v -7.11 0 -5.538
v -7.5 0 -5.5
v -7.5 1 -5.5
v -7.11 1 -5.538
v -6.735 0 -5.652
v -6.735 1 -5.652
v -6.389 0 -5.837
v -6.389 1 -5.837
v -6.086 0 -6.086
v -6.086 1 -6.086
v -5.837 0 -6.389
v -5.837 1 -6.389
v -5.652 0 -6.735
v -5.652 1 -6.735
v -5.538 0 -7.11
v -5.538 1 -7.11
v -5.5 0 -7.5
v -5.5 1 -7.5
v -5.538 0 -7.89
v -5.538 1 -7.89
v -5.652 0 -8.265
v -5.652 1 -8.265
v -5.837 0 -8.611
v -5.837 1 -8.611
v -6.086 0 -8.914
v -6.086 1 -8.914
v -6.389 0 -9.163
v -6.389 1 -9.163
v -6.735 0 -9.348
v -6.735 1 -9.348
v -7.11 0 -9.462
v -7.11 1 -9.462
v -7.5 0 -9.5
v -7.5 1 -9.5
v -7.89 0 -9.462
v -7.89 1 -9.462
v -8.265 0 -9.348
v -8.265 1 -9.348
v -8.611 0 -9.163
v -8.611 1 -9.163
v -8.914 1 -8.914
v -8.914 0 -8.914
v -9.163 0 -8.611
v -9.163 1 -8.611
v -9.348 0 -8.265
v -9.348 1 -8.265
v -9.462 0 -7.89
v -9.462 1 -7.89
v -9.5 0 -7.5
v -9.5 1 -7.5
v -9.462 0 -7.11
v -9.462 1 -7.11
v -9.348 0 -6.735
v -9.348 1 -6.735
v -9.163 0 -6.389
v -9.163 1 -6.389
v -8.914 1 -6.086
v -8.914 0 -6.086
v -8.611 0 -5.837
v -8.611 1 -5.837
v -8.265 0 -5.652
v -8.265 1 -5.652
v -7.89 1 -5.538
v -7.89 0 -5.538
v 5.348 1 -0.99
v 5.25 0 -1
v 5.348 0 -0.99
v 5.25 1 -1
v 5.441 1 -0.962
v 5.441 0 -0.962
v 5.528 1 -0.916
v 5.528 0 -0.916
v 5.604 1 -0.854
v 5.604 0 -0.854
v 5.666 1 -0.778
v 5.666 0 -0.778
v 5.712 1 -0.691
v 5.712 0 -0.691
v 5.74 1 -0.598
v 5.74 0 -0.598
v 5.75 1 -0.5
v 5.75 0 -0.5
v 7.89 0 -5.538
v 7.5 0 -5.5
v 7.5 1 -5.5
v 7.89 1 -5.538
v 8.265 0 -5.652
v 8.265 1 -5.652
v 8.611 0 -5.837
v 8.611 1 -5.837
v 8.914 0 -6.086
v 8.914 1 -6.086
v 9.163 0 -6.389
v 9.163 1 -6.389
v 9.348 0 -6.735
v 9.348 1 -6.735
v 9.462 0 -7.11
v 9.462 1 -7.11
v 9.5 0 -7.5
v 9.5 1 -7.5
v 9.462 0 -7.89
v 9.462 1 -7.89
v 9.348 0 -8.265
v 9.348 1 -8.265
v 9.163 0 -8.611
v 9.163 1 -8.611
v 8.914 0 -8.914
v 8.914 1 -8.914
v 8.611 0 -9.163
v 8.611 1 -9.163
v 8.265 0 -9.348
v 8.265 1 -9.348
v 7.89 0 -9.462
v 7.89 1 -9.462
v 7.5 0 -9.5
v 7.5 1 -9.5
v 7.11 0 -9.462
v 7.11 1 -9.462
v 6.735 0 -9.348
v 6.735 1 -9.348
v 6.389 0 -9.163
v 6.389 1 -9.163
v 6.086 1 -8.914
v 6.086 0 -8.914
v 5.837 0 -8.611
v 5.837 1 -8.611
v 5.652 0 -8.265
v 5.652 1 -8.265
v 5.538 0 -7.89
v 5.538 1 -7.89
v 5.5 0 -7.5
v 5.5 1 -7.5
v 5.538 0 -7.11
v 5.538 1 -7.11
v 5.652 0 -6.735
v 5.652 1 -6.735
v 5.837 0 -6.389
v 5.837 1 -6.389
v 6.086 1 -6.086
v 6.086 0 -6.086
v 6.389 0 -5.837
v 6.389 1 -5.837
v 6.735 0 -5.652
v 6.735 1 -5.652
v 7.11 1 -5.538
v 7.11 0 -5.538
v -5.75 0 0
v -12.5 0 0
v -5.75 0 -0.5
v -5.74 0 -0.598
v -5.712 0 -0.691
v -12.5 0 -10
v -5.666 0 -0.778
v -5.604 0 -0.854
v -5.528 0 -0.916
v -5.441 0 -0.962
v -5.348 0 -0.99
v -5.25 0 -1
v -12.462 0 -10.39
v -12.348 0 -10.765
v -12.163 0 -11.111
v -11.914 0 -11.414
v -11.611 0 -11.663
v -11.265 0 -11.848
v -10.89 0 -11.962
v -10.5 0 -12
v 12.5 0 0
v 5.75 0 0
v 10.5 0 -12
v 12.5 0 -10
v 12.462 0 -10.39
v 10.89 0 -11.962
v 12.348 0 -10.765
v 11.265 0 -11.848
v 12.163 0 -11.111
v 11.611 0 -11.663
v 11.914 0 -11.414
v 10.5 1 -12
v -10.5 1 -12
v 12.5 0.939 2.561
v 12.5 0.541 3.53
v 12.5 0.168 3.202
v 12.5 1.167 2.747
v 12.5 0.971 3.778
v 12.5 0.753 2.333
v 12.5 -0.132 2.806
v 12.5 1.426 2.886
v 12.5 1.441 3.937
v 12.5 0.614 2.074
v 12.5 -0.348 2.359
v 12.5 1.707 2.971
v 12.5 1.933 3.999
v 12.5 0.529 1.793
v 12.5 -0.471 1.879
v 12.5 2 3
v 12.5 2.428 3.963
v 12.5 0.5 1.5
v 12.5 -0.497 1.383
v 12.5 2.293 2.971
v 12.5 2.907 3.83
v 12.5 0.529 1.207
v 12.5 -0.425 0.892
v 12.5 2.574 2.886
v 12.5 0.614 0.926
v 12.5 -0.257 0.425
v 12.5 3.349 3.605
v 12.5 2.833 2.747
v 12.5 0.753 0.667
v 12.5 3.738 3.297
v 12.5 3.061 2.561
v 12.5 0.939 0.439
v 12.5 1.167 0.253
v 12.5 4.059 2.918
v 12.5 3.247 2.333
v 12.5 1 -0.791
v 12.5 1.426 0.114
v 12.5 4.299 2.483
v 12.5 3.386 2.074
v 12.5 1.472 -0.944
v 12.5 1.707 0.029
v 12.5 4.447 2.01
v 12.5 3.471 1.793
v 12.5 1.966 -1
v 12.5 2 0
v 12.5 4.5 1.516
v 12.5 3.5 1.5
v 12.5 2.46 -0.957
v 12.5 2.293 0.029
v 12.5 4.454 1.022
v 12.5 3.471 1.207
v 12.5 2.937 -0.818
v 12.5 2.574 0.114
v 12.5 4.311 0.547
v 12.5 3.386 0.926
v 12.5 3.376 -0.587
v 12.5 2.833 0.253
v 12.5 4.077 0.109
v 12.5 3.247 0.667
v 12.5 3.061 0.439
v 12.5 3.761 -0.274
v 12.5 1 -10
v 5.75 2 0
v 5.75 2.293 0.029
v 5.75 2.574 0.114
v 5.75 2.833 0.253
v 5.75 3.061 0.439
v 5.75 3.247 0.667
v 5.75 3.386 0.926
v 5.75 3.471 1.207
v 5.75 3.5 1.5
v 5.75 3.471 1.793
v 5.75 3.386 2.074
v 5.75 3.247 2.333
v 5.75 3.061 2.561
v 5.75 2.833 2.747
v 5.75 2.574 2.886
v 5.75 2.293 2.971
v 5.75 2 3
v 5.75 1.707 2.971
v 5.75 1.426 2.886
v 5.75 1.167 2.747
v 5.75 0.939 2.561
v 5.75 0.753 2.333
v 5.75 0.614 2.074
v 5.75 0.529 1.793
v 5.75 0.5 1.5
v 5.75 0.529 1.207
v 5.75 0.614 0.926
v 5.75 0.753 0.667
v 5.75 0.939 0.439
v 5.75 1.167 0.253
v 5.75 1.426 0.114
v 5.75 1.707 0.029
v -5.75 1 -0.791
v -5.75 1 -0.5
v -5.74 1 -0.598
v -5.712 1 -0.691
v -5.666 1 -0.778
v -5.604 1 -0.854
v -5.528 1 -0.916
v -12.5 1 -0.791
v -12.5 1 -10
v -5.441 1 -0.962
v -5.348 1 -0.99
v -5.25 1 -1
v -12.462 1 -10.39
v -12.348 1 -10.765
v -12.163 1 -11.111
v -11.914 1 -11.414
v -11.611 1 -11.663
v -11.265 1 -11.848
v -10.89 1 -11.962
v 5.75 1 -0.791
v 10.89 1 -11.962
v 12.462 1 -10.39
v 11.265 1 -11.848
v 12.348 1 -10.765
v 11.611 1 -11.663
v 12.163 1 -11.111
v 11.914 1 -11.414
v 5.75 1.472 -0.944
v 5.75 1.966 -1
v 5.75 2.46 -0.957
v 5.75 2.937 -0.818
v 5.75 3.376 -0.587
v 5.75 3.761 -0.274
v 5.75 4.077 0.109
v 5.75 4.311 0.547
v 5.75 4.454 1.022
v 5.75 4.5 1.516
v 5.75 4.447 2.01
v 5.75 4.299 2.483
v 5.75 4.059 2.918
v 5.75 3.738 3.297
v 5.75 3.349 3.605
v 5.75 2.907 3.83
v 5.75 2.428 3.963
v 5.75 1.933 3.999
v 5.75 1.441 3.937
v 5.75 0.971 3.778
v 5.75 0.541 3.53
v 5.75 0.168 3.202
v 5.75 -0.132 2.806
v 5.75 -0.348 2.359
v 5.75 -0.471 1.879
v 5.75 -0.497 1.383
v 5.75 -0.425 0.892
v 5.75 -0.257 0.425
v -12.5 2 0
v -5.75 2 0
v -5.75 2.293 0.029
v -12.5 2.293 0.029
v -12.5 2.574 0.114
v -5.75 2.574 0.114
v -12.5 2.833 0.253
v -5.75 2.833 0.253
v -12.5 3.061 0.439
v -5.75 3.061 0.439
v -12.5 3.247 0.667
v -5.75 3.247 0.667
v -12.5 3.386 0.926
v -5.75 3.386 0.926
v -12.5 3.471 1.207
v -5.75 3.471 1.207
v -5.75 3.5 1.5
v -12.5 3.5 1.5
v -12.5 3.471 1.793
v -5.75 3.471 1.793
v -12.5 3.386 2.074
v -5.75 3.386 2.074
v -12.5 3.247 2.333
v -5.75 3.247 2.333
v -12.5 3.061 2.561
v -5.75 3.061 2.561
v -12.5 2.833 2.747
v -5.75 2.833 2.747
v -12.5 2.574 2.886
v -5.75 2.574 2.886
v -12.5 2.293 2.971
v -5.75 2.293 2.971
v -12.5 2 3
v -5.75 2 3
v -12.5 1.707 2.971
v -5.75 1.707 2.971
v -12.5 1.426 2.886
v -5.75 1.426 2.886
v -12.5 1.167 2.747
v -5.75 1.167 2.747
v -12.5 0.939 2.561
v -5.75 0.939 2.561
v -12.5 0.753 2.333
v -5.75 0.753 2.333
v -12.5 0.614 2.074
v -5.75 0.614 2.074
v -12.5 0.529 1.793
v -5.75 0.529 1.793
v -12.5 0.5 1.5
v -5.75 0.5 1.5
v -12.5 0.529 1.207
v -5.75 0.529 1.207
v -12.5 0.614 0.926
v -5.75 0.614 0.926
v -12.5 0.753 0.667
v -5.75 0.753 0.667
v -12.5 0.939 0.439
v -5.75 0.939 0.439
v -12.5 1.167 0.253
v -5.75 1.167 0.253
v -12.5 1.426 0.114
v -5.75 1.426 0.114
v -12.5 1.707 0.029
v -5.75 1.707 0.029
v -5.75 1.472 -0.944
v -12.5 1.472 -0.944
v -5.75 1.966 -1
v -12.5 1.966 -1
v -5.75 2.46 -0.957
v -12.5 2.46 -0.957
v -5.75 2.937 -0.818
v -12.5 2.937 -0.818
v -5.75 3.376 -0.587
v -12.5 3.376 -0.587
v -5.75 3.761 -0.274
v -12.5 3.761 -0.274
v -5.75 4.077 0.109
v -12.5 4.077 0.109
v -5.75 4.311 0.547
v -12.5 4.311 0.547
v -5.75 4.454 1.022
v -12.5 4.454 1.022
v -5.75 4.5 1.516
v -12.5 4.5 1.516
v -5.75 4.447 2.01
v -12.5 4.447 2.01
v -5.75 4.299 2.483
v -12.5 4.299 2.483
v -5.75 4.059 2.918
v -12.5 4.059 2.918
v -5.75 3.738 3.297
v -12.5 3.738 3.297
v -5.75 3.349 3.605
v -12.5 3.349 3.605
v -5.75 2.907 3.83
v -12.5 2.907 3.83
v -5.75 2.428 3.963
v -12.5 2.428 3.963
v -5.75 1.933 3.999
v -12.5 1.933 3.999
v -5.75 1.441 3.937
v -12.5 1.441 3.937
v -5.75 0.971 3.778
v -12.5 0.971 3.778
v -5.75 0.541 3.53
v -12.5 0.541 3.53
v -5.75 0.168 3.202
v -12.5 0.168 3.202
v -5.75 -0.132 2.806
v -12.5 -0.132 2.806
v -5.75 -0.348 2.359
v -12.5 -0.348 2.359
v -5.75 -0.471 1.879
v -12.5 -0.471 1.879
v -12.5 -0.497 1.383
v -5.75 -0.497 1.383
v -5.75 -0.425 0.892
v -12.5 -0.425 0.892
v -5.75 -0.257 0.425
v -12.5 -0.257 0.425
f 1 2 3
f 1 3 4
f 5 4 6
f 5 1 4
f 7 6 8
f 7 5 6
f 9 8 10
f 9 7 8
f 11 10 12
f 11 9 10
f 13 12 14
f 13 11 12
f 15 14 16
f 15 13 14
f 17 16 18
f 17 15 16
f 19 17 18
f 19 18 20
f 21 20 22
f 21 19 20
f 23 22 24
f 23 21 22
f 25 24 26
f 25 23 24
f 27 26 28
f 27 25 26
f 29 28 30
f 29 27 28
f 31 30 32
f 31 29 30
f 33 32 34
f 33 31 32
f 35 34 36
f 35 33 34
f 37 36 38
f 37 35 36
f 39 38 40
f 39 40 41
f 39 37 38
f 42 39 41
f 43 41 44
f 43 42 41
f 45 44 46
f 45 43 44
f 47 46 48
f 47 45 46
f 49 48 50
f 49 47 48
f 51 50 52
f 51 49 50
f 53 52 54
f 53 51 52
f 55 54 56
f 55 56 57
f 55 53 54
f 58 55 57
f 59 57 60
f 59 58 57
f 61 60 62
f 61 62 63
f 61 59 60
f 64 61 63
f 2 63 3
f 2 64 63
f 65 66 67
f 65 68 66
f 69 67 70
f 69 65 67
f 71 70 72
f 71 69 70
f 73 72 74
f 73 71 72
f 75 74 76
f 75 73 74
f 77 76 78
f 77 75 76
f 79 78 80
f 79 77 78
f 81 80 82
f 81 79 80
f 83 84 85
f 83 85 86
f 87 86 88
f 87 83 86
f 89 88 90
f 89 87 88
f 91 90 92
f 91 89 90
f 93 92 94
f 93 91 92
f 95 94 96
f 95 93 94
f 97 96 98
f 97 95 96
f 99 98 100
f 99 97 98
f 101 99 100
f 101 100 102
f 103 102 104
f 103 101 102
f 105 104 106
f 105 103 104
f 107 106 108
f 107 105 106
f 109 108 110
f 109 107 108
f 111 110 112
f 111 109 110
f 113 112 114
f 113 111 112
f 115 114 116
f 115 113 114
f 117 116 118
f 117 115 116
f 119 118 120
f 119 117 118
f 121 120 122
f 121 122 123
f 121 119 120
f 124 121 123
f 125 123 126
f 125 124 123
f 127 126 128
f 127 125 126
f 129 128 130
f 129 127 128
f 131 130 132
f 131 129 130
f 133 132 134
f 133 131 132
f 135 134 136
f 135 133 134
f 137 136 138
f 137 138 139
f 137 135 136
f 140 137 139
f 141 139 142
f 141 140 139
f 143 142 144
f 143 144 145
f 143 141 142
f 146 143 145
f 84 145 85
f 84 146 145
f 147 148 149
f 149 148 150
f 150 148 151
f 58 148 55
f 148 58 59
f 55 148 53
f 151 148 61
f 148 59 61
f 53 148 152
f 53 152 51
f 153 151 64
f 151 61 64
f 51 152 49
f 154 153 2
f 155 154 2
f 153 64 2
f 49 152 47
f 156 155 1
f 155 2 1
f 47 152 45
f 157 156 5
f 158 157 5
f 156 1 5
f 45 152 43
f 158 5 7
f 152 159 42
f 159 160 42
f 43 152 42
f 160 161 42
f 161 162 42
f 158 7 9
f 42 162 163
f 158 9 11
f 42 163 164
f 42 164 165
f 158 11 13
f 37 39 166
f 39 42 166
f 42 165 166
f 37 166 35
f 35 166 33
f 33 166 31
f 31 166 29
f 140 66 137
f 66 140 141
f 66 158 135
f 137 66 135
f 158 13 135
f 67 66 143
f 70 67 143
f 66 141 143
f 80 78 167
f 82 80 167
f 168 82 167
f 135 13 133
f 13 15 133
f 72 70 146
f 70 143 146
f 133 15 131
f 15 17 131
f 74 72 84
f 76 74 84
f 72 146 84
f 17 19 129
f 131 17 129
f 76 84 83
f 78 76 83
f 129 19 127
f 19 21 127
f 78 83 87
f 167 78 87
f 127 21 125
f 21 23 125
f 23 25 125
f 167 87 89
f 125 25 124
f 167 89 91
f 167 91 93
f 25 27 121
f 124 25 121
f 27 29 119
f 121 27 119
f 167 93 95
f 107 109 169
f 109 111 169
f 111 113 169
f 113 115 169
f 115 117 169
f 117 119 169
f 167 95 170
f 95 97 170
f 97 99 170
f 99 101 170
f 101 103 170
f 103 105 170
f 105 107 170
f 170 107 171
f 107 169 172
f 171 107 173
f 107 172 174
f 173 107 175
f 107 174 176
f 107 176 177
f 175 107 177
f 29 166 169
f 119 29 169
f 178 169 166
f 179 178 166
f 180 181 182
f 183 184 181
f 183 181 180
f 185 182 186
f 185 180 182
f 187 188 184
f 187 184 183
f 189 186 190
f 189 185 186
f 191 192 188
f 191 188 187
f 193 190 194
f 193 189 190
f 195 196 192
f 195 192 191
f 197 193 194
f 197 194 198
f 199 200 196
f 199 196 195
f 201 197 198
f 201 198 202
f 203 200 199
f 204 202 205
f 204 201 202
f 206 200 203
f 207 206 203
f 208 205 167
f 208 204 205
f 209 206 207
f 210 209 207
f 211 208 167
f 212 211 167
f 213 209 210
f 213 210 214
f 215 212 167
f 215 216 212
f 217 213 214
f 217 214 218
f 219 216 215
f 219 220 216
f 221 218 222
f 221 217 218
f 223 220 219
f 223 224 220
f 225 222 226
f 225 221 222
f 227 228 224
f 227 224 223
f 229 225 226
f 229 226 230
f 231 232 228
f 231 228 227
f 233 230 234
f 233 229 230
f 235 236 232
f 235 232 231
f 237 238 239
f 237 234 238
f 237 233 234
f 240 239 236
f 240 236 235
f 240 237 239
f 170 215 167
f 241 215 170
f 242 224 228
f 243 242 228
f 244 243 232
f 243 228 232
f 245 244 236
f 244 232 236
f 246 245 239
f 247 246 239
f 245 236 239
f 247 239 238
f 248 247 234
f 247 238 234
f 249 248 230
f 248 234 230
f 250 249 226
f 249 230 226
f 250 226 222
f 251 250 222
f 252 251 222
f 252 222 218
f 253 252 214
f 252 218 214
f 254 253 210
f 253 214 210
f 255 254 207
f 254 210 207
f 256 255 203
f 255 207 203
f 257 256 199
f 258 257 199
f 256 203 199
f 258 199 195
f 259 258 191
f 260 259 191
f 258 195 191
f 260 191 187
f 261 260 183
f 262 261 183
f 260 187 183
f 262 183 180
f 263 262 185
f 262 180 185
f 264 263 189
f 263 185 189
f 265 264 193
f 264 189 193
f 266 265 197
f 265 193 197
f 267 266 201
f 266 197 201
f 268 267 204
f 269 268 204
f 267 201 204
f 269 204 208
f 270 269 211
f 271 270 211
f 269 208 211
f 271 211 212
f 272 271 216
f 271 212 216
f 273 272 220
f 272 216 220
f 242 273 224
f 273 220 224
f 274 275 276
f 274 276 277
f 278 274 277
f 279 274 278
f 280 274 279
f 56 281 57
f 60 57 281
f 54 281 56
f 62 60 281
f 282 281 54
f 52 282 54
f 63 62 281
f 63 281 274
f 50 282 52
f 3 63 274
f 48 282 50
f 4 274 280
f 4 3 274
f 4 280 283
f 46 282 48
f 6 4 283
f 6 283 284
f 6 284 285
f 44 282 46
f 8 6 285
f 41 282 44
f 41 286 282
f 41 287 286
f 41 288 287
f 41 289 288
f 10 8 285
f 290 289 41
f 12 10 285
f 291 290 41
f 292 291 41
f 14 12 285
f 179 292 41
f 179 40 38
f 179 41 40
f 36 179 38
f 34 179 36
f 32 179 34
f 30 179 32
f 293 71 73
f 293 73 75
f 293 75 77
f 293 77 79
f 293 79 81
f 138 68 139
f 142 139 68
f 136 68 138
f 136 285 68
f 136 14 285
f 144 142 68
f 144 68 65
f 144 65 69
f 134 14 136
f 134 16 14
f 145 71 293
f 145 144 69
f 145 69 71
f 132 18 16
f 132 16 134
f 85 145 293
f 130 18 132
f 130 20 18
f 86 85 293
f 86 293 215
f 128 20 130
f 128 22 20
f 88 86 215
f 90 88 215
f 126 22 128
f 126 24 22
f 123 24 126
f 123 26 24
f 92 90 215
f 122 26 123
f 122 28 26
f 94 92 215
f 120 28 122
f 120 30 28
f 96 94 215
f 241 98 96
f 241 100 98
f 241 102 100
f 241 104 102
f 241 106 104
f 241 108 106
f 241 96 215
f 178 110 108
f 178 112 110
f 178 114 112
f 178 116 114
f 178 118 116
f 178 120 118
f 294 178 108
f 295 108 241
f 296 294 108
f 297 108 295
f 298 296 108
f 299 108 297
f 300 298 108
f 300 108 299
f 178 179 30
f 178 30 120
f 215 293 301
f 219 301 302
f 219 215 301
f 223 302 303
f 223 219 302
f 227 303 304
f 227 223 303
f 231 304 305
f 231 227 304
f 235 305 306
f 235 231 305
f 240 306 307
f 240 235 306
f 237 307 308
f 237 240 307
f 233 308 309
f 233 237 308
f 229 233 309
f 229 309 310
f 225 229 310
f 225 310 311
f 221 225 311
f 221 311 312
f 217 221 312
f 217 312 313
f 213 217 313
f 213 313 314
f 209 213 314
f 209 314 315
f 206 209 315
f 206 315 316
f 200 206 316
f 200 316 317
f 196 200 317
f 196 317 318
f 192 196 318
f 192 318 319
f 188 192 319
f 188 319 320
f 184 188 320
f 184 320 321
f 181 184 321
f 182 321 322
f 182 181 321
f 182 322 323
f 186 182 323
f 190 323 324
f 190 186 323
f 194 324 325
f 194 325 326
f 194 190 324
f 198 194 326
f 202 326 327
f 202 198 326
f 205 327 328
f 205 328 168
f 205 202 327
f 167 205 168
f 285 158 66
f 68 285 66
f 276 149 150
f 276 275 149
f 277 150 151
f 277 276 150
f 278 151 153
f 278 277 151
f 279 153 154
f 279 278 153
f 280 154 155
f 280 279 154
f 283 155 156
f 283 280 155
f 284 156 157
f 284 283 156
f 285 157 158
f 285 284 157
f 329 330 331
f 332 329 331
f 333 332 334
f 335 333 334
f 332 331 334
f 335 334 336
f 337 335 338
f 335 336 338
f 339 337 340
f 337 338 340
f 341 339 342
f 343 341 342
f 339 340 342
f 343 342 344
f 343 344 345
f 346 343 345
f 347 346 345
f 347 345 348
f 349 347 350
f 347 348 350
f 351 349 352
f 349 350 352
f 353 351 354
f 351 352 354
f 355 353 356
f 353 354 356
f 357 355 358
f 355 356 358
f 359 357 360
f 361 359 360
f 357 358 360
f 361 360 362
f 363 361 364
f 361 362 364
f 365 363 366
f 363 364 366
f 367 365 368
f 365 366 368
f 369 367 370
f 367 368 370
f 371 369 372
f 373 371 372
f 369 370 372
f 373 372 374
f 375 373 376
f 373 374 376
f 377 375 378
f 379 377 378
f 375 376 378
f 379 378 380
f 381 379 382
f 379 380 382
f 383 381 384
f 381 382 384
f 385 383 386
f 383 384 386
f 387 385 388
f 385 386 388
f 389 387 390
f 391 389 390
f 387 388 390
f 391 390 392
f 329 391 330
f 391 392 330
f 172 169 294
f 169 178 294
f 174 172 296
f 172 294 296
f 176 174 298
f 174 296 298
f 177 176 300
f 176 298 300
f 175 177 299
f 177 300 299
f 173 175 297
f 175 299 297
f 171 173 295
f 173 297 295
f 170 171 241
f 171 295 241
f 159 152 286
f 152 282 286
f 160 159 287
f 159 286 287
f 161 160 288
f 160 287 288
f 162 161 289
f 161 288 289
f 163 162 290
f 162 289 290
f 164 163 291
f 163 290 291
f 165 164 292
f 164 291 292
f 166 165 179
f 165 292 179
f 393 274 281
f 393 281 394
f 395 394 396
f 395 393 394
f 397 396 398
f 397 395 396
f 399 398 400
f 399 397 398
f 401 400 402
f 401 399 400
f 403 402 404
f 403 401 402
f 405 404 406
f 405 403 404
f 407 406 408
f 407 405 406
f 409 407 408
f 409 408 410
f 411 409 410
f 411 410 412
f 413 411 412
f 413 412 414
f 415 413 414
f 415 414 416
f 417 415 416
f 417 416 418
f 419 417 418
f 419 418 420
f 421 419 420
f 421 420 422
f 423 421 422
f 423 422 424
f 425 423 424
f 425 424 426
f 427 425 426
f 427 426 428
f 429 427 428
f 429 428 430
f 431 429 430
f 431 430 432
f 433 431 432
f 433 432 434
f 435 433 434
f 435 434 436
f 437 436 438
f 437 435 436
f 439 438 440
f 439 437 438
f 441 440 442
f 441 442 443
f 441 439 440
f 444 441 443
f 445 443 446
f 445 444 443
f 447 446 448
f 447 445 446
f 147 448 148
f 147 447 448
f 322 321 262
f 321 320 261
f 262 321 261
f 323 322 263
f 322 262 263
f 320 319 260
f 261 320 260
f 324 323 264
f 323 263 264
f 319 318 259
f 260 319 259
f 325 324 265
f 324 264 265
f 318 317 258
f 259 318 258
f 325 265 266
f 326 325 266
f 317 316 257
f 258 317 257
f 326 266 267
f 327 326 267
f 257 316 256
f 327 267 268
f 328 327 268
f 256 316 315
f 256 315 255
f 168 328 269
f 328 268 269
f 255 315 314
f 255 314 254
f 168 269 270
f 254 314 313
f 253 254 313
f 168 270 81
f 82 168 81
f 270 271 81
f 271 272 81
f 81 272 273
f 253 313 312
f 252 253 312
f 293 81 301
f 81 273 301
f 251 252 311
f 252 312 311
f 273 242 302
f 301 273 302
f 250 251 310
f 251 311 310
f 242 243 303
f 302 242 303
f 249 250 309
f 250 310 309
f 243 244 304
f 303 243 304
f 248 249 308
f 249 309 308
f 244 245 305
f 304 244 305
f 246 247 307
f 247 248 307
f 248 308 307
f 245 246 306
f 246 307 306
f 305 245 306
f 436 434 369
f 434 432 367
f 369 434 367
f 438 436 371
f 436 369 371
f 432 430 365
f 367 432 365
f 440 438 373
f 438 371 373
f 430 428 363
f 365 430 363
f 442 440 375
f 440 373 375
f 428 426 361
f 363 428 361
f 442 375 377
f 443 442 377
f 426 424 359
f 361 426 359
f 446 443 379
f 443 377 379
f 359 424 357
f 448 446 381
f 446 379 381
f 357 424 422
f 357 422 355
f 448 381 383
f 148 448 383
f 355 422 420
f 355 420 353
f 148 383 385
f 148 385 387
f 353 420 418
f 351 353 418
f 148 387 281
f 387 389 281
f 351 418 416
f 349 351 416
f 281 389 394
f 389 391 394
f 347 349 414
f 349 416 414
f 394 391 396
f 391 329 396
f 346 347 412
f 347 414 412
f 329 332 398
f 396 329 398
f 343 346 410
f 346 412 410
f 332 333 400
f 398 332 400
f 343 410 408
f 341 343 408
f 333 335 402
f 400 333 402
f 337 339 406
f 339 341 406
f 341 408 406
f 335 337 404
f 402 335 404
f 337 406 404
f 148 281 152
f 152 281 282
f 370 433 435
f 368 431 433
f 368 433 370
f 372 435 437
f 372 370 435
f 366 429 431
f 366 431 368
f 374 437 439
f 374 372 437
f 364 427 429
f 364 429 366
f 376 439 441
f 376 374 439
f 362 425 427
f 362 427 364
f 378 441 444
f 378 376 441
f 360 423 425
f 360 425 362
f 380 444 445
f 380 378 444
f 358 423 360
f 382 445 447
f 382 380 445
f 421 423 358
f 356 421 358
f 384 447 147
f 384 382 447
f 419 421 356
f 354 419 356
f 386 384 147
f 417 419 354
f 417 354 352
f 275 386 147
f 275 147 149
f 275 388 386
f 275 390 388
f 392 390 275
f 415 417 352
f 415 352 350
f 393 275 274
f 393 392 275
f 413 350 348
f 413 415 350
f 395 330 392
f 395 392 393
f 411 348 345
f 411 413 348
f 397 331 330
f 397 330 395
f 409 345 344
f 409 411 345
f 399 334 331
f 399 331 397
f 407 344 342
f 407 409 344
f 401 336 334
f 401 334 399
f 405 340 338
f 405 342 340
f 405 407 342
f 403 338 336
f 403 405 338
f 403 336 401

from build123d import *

# Parameters (mm, degrees)
SKETCH_1_R      = 2
EXTRUDE_1_DEPTH = 1
FILLET_1_R      = 2
FILLET_2_R      = 0.5
EXTRUDE_START   = -5.75
SKETCH_2_R      = 2.5
SKETCH_2_R_2    = 1.5
EXTRUDE_2_DEPTH = 6.75
EXTRUDE_START_2 = 12.5
SKETCH_2_3_R    = 2.5
SKETCH_2_3_R_2  = 1.5
EXTRUDE_3_DEPTH = 6.75


with BuildPart() as part:
    # 草图1 → 凸台-拉伸1 (new body)
    with BuildSketch(Plane(origin=(0, 0, 0), x_dir=(1, 0, 0), z_dir=(0, 1, 0))):
        Polygon((-5.75, 0), (-5.75, 1), (5.75, 1), (5.75, 0), (12.5, 0), (12.5, 1), (12.5, 12), (-12.5, 12), (-12.5, 1), (-12.5, 0), align=None)
        with Locations(Location((-7.5, 7.5, 0), (0, 0, 270))):
            Circle(SKETCH_1_R, mode=Mode.SUBTRACT)
        with Locations(Location((7.5, 7.5, 0), (0, 0, 270))):
            Circle(SKETCH_1_R, mode=Mode.SUBTRACT)
    extrude(amount=EXTRUDE_1_DEPTH)

    # 圆角1
    fillet_1_edges = [part.edges().sort_by_distance(p)[0] for p in [
        (-12.5, 0.5, -12),
        (12.5, 0.5, -12),
    ]]
    fillet(fillet_1_edges, radius=FILLET_1_R)

    # 圆角2
    fillet_2_edges = [part.edges().sort_by_distance(p)[0] for p in [
        (5.75, 0.5, -1),
        (-5.75, 0.5, -1),
    ]]
    fillet(fillet_2_edges, radius=FILLET_2_R)

    # 草图2 → 凸台-拉伸2 (add)
    with BuildSketch(Plane(origin=(0, 0, 0), x_dir=(0, 0, -1), z_dir=(1, 0, 0)).offset(EXTRUDE_START)):
        with Locations((-1.5, 2)):
            Circle(SKETCH_2_R)
        with Locations((-1.5, 2)):
            Circle(SKETCH_2_R_2, mode=Mode.SUBTRACT)
    extrude(amount=-EXTRUDE_2_DEPTH)

    # 草图2<3> → 凸台-拉伸3 (add)
    with BuildSketch(Plane(origin=(0, 0, 0), x_dir=(0, 0, -1), z_dir=(1, 0, 0)).offset(EXTRUDE_START_2)):
        with Locations((-1.5, 2)):
            Circle(SKETCH_2_3_R)
        with Locations((-1.5, 2)):
            Circle(SKETCH_2_3_R_2, mode=Mode.SUBTRACT)
    extrude(amount=-EXTRUDE_3_DEPTH)


solid = part.part
